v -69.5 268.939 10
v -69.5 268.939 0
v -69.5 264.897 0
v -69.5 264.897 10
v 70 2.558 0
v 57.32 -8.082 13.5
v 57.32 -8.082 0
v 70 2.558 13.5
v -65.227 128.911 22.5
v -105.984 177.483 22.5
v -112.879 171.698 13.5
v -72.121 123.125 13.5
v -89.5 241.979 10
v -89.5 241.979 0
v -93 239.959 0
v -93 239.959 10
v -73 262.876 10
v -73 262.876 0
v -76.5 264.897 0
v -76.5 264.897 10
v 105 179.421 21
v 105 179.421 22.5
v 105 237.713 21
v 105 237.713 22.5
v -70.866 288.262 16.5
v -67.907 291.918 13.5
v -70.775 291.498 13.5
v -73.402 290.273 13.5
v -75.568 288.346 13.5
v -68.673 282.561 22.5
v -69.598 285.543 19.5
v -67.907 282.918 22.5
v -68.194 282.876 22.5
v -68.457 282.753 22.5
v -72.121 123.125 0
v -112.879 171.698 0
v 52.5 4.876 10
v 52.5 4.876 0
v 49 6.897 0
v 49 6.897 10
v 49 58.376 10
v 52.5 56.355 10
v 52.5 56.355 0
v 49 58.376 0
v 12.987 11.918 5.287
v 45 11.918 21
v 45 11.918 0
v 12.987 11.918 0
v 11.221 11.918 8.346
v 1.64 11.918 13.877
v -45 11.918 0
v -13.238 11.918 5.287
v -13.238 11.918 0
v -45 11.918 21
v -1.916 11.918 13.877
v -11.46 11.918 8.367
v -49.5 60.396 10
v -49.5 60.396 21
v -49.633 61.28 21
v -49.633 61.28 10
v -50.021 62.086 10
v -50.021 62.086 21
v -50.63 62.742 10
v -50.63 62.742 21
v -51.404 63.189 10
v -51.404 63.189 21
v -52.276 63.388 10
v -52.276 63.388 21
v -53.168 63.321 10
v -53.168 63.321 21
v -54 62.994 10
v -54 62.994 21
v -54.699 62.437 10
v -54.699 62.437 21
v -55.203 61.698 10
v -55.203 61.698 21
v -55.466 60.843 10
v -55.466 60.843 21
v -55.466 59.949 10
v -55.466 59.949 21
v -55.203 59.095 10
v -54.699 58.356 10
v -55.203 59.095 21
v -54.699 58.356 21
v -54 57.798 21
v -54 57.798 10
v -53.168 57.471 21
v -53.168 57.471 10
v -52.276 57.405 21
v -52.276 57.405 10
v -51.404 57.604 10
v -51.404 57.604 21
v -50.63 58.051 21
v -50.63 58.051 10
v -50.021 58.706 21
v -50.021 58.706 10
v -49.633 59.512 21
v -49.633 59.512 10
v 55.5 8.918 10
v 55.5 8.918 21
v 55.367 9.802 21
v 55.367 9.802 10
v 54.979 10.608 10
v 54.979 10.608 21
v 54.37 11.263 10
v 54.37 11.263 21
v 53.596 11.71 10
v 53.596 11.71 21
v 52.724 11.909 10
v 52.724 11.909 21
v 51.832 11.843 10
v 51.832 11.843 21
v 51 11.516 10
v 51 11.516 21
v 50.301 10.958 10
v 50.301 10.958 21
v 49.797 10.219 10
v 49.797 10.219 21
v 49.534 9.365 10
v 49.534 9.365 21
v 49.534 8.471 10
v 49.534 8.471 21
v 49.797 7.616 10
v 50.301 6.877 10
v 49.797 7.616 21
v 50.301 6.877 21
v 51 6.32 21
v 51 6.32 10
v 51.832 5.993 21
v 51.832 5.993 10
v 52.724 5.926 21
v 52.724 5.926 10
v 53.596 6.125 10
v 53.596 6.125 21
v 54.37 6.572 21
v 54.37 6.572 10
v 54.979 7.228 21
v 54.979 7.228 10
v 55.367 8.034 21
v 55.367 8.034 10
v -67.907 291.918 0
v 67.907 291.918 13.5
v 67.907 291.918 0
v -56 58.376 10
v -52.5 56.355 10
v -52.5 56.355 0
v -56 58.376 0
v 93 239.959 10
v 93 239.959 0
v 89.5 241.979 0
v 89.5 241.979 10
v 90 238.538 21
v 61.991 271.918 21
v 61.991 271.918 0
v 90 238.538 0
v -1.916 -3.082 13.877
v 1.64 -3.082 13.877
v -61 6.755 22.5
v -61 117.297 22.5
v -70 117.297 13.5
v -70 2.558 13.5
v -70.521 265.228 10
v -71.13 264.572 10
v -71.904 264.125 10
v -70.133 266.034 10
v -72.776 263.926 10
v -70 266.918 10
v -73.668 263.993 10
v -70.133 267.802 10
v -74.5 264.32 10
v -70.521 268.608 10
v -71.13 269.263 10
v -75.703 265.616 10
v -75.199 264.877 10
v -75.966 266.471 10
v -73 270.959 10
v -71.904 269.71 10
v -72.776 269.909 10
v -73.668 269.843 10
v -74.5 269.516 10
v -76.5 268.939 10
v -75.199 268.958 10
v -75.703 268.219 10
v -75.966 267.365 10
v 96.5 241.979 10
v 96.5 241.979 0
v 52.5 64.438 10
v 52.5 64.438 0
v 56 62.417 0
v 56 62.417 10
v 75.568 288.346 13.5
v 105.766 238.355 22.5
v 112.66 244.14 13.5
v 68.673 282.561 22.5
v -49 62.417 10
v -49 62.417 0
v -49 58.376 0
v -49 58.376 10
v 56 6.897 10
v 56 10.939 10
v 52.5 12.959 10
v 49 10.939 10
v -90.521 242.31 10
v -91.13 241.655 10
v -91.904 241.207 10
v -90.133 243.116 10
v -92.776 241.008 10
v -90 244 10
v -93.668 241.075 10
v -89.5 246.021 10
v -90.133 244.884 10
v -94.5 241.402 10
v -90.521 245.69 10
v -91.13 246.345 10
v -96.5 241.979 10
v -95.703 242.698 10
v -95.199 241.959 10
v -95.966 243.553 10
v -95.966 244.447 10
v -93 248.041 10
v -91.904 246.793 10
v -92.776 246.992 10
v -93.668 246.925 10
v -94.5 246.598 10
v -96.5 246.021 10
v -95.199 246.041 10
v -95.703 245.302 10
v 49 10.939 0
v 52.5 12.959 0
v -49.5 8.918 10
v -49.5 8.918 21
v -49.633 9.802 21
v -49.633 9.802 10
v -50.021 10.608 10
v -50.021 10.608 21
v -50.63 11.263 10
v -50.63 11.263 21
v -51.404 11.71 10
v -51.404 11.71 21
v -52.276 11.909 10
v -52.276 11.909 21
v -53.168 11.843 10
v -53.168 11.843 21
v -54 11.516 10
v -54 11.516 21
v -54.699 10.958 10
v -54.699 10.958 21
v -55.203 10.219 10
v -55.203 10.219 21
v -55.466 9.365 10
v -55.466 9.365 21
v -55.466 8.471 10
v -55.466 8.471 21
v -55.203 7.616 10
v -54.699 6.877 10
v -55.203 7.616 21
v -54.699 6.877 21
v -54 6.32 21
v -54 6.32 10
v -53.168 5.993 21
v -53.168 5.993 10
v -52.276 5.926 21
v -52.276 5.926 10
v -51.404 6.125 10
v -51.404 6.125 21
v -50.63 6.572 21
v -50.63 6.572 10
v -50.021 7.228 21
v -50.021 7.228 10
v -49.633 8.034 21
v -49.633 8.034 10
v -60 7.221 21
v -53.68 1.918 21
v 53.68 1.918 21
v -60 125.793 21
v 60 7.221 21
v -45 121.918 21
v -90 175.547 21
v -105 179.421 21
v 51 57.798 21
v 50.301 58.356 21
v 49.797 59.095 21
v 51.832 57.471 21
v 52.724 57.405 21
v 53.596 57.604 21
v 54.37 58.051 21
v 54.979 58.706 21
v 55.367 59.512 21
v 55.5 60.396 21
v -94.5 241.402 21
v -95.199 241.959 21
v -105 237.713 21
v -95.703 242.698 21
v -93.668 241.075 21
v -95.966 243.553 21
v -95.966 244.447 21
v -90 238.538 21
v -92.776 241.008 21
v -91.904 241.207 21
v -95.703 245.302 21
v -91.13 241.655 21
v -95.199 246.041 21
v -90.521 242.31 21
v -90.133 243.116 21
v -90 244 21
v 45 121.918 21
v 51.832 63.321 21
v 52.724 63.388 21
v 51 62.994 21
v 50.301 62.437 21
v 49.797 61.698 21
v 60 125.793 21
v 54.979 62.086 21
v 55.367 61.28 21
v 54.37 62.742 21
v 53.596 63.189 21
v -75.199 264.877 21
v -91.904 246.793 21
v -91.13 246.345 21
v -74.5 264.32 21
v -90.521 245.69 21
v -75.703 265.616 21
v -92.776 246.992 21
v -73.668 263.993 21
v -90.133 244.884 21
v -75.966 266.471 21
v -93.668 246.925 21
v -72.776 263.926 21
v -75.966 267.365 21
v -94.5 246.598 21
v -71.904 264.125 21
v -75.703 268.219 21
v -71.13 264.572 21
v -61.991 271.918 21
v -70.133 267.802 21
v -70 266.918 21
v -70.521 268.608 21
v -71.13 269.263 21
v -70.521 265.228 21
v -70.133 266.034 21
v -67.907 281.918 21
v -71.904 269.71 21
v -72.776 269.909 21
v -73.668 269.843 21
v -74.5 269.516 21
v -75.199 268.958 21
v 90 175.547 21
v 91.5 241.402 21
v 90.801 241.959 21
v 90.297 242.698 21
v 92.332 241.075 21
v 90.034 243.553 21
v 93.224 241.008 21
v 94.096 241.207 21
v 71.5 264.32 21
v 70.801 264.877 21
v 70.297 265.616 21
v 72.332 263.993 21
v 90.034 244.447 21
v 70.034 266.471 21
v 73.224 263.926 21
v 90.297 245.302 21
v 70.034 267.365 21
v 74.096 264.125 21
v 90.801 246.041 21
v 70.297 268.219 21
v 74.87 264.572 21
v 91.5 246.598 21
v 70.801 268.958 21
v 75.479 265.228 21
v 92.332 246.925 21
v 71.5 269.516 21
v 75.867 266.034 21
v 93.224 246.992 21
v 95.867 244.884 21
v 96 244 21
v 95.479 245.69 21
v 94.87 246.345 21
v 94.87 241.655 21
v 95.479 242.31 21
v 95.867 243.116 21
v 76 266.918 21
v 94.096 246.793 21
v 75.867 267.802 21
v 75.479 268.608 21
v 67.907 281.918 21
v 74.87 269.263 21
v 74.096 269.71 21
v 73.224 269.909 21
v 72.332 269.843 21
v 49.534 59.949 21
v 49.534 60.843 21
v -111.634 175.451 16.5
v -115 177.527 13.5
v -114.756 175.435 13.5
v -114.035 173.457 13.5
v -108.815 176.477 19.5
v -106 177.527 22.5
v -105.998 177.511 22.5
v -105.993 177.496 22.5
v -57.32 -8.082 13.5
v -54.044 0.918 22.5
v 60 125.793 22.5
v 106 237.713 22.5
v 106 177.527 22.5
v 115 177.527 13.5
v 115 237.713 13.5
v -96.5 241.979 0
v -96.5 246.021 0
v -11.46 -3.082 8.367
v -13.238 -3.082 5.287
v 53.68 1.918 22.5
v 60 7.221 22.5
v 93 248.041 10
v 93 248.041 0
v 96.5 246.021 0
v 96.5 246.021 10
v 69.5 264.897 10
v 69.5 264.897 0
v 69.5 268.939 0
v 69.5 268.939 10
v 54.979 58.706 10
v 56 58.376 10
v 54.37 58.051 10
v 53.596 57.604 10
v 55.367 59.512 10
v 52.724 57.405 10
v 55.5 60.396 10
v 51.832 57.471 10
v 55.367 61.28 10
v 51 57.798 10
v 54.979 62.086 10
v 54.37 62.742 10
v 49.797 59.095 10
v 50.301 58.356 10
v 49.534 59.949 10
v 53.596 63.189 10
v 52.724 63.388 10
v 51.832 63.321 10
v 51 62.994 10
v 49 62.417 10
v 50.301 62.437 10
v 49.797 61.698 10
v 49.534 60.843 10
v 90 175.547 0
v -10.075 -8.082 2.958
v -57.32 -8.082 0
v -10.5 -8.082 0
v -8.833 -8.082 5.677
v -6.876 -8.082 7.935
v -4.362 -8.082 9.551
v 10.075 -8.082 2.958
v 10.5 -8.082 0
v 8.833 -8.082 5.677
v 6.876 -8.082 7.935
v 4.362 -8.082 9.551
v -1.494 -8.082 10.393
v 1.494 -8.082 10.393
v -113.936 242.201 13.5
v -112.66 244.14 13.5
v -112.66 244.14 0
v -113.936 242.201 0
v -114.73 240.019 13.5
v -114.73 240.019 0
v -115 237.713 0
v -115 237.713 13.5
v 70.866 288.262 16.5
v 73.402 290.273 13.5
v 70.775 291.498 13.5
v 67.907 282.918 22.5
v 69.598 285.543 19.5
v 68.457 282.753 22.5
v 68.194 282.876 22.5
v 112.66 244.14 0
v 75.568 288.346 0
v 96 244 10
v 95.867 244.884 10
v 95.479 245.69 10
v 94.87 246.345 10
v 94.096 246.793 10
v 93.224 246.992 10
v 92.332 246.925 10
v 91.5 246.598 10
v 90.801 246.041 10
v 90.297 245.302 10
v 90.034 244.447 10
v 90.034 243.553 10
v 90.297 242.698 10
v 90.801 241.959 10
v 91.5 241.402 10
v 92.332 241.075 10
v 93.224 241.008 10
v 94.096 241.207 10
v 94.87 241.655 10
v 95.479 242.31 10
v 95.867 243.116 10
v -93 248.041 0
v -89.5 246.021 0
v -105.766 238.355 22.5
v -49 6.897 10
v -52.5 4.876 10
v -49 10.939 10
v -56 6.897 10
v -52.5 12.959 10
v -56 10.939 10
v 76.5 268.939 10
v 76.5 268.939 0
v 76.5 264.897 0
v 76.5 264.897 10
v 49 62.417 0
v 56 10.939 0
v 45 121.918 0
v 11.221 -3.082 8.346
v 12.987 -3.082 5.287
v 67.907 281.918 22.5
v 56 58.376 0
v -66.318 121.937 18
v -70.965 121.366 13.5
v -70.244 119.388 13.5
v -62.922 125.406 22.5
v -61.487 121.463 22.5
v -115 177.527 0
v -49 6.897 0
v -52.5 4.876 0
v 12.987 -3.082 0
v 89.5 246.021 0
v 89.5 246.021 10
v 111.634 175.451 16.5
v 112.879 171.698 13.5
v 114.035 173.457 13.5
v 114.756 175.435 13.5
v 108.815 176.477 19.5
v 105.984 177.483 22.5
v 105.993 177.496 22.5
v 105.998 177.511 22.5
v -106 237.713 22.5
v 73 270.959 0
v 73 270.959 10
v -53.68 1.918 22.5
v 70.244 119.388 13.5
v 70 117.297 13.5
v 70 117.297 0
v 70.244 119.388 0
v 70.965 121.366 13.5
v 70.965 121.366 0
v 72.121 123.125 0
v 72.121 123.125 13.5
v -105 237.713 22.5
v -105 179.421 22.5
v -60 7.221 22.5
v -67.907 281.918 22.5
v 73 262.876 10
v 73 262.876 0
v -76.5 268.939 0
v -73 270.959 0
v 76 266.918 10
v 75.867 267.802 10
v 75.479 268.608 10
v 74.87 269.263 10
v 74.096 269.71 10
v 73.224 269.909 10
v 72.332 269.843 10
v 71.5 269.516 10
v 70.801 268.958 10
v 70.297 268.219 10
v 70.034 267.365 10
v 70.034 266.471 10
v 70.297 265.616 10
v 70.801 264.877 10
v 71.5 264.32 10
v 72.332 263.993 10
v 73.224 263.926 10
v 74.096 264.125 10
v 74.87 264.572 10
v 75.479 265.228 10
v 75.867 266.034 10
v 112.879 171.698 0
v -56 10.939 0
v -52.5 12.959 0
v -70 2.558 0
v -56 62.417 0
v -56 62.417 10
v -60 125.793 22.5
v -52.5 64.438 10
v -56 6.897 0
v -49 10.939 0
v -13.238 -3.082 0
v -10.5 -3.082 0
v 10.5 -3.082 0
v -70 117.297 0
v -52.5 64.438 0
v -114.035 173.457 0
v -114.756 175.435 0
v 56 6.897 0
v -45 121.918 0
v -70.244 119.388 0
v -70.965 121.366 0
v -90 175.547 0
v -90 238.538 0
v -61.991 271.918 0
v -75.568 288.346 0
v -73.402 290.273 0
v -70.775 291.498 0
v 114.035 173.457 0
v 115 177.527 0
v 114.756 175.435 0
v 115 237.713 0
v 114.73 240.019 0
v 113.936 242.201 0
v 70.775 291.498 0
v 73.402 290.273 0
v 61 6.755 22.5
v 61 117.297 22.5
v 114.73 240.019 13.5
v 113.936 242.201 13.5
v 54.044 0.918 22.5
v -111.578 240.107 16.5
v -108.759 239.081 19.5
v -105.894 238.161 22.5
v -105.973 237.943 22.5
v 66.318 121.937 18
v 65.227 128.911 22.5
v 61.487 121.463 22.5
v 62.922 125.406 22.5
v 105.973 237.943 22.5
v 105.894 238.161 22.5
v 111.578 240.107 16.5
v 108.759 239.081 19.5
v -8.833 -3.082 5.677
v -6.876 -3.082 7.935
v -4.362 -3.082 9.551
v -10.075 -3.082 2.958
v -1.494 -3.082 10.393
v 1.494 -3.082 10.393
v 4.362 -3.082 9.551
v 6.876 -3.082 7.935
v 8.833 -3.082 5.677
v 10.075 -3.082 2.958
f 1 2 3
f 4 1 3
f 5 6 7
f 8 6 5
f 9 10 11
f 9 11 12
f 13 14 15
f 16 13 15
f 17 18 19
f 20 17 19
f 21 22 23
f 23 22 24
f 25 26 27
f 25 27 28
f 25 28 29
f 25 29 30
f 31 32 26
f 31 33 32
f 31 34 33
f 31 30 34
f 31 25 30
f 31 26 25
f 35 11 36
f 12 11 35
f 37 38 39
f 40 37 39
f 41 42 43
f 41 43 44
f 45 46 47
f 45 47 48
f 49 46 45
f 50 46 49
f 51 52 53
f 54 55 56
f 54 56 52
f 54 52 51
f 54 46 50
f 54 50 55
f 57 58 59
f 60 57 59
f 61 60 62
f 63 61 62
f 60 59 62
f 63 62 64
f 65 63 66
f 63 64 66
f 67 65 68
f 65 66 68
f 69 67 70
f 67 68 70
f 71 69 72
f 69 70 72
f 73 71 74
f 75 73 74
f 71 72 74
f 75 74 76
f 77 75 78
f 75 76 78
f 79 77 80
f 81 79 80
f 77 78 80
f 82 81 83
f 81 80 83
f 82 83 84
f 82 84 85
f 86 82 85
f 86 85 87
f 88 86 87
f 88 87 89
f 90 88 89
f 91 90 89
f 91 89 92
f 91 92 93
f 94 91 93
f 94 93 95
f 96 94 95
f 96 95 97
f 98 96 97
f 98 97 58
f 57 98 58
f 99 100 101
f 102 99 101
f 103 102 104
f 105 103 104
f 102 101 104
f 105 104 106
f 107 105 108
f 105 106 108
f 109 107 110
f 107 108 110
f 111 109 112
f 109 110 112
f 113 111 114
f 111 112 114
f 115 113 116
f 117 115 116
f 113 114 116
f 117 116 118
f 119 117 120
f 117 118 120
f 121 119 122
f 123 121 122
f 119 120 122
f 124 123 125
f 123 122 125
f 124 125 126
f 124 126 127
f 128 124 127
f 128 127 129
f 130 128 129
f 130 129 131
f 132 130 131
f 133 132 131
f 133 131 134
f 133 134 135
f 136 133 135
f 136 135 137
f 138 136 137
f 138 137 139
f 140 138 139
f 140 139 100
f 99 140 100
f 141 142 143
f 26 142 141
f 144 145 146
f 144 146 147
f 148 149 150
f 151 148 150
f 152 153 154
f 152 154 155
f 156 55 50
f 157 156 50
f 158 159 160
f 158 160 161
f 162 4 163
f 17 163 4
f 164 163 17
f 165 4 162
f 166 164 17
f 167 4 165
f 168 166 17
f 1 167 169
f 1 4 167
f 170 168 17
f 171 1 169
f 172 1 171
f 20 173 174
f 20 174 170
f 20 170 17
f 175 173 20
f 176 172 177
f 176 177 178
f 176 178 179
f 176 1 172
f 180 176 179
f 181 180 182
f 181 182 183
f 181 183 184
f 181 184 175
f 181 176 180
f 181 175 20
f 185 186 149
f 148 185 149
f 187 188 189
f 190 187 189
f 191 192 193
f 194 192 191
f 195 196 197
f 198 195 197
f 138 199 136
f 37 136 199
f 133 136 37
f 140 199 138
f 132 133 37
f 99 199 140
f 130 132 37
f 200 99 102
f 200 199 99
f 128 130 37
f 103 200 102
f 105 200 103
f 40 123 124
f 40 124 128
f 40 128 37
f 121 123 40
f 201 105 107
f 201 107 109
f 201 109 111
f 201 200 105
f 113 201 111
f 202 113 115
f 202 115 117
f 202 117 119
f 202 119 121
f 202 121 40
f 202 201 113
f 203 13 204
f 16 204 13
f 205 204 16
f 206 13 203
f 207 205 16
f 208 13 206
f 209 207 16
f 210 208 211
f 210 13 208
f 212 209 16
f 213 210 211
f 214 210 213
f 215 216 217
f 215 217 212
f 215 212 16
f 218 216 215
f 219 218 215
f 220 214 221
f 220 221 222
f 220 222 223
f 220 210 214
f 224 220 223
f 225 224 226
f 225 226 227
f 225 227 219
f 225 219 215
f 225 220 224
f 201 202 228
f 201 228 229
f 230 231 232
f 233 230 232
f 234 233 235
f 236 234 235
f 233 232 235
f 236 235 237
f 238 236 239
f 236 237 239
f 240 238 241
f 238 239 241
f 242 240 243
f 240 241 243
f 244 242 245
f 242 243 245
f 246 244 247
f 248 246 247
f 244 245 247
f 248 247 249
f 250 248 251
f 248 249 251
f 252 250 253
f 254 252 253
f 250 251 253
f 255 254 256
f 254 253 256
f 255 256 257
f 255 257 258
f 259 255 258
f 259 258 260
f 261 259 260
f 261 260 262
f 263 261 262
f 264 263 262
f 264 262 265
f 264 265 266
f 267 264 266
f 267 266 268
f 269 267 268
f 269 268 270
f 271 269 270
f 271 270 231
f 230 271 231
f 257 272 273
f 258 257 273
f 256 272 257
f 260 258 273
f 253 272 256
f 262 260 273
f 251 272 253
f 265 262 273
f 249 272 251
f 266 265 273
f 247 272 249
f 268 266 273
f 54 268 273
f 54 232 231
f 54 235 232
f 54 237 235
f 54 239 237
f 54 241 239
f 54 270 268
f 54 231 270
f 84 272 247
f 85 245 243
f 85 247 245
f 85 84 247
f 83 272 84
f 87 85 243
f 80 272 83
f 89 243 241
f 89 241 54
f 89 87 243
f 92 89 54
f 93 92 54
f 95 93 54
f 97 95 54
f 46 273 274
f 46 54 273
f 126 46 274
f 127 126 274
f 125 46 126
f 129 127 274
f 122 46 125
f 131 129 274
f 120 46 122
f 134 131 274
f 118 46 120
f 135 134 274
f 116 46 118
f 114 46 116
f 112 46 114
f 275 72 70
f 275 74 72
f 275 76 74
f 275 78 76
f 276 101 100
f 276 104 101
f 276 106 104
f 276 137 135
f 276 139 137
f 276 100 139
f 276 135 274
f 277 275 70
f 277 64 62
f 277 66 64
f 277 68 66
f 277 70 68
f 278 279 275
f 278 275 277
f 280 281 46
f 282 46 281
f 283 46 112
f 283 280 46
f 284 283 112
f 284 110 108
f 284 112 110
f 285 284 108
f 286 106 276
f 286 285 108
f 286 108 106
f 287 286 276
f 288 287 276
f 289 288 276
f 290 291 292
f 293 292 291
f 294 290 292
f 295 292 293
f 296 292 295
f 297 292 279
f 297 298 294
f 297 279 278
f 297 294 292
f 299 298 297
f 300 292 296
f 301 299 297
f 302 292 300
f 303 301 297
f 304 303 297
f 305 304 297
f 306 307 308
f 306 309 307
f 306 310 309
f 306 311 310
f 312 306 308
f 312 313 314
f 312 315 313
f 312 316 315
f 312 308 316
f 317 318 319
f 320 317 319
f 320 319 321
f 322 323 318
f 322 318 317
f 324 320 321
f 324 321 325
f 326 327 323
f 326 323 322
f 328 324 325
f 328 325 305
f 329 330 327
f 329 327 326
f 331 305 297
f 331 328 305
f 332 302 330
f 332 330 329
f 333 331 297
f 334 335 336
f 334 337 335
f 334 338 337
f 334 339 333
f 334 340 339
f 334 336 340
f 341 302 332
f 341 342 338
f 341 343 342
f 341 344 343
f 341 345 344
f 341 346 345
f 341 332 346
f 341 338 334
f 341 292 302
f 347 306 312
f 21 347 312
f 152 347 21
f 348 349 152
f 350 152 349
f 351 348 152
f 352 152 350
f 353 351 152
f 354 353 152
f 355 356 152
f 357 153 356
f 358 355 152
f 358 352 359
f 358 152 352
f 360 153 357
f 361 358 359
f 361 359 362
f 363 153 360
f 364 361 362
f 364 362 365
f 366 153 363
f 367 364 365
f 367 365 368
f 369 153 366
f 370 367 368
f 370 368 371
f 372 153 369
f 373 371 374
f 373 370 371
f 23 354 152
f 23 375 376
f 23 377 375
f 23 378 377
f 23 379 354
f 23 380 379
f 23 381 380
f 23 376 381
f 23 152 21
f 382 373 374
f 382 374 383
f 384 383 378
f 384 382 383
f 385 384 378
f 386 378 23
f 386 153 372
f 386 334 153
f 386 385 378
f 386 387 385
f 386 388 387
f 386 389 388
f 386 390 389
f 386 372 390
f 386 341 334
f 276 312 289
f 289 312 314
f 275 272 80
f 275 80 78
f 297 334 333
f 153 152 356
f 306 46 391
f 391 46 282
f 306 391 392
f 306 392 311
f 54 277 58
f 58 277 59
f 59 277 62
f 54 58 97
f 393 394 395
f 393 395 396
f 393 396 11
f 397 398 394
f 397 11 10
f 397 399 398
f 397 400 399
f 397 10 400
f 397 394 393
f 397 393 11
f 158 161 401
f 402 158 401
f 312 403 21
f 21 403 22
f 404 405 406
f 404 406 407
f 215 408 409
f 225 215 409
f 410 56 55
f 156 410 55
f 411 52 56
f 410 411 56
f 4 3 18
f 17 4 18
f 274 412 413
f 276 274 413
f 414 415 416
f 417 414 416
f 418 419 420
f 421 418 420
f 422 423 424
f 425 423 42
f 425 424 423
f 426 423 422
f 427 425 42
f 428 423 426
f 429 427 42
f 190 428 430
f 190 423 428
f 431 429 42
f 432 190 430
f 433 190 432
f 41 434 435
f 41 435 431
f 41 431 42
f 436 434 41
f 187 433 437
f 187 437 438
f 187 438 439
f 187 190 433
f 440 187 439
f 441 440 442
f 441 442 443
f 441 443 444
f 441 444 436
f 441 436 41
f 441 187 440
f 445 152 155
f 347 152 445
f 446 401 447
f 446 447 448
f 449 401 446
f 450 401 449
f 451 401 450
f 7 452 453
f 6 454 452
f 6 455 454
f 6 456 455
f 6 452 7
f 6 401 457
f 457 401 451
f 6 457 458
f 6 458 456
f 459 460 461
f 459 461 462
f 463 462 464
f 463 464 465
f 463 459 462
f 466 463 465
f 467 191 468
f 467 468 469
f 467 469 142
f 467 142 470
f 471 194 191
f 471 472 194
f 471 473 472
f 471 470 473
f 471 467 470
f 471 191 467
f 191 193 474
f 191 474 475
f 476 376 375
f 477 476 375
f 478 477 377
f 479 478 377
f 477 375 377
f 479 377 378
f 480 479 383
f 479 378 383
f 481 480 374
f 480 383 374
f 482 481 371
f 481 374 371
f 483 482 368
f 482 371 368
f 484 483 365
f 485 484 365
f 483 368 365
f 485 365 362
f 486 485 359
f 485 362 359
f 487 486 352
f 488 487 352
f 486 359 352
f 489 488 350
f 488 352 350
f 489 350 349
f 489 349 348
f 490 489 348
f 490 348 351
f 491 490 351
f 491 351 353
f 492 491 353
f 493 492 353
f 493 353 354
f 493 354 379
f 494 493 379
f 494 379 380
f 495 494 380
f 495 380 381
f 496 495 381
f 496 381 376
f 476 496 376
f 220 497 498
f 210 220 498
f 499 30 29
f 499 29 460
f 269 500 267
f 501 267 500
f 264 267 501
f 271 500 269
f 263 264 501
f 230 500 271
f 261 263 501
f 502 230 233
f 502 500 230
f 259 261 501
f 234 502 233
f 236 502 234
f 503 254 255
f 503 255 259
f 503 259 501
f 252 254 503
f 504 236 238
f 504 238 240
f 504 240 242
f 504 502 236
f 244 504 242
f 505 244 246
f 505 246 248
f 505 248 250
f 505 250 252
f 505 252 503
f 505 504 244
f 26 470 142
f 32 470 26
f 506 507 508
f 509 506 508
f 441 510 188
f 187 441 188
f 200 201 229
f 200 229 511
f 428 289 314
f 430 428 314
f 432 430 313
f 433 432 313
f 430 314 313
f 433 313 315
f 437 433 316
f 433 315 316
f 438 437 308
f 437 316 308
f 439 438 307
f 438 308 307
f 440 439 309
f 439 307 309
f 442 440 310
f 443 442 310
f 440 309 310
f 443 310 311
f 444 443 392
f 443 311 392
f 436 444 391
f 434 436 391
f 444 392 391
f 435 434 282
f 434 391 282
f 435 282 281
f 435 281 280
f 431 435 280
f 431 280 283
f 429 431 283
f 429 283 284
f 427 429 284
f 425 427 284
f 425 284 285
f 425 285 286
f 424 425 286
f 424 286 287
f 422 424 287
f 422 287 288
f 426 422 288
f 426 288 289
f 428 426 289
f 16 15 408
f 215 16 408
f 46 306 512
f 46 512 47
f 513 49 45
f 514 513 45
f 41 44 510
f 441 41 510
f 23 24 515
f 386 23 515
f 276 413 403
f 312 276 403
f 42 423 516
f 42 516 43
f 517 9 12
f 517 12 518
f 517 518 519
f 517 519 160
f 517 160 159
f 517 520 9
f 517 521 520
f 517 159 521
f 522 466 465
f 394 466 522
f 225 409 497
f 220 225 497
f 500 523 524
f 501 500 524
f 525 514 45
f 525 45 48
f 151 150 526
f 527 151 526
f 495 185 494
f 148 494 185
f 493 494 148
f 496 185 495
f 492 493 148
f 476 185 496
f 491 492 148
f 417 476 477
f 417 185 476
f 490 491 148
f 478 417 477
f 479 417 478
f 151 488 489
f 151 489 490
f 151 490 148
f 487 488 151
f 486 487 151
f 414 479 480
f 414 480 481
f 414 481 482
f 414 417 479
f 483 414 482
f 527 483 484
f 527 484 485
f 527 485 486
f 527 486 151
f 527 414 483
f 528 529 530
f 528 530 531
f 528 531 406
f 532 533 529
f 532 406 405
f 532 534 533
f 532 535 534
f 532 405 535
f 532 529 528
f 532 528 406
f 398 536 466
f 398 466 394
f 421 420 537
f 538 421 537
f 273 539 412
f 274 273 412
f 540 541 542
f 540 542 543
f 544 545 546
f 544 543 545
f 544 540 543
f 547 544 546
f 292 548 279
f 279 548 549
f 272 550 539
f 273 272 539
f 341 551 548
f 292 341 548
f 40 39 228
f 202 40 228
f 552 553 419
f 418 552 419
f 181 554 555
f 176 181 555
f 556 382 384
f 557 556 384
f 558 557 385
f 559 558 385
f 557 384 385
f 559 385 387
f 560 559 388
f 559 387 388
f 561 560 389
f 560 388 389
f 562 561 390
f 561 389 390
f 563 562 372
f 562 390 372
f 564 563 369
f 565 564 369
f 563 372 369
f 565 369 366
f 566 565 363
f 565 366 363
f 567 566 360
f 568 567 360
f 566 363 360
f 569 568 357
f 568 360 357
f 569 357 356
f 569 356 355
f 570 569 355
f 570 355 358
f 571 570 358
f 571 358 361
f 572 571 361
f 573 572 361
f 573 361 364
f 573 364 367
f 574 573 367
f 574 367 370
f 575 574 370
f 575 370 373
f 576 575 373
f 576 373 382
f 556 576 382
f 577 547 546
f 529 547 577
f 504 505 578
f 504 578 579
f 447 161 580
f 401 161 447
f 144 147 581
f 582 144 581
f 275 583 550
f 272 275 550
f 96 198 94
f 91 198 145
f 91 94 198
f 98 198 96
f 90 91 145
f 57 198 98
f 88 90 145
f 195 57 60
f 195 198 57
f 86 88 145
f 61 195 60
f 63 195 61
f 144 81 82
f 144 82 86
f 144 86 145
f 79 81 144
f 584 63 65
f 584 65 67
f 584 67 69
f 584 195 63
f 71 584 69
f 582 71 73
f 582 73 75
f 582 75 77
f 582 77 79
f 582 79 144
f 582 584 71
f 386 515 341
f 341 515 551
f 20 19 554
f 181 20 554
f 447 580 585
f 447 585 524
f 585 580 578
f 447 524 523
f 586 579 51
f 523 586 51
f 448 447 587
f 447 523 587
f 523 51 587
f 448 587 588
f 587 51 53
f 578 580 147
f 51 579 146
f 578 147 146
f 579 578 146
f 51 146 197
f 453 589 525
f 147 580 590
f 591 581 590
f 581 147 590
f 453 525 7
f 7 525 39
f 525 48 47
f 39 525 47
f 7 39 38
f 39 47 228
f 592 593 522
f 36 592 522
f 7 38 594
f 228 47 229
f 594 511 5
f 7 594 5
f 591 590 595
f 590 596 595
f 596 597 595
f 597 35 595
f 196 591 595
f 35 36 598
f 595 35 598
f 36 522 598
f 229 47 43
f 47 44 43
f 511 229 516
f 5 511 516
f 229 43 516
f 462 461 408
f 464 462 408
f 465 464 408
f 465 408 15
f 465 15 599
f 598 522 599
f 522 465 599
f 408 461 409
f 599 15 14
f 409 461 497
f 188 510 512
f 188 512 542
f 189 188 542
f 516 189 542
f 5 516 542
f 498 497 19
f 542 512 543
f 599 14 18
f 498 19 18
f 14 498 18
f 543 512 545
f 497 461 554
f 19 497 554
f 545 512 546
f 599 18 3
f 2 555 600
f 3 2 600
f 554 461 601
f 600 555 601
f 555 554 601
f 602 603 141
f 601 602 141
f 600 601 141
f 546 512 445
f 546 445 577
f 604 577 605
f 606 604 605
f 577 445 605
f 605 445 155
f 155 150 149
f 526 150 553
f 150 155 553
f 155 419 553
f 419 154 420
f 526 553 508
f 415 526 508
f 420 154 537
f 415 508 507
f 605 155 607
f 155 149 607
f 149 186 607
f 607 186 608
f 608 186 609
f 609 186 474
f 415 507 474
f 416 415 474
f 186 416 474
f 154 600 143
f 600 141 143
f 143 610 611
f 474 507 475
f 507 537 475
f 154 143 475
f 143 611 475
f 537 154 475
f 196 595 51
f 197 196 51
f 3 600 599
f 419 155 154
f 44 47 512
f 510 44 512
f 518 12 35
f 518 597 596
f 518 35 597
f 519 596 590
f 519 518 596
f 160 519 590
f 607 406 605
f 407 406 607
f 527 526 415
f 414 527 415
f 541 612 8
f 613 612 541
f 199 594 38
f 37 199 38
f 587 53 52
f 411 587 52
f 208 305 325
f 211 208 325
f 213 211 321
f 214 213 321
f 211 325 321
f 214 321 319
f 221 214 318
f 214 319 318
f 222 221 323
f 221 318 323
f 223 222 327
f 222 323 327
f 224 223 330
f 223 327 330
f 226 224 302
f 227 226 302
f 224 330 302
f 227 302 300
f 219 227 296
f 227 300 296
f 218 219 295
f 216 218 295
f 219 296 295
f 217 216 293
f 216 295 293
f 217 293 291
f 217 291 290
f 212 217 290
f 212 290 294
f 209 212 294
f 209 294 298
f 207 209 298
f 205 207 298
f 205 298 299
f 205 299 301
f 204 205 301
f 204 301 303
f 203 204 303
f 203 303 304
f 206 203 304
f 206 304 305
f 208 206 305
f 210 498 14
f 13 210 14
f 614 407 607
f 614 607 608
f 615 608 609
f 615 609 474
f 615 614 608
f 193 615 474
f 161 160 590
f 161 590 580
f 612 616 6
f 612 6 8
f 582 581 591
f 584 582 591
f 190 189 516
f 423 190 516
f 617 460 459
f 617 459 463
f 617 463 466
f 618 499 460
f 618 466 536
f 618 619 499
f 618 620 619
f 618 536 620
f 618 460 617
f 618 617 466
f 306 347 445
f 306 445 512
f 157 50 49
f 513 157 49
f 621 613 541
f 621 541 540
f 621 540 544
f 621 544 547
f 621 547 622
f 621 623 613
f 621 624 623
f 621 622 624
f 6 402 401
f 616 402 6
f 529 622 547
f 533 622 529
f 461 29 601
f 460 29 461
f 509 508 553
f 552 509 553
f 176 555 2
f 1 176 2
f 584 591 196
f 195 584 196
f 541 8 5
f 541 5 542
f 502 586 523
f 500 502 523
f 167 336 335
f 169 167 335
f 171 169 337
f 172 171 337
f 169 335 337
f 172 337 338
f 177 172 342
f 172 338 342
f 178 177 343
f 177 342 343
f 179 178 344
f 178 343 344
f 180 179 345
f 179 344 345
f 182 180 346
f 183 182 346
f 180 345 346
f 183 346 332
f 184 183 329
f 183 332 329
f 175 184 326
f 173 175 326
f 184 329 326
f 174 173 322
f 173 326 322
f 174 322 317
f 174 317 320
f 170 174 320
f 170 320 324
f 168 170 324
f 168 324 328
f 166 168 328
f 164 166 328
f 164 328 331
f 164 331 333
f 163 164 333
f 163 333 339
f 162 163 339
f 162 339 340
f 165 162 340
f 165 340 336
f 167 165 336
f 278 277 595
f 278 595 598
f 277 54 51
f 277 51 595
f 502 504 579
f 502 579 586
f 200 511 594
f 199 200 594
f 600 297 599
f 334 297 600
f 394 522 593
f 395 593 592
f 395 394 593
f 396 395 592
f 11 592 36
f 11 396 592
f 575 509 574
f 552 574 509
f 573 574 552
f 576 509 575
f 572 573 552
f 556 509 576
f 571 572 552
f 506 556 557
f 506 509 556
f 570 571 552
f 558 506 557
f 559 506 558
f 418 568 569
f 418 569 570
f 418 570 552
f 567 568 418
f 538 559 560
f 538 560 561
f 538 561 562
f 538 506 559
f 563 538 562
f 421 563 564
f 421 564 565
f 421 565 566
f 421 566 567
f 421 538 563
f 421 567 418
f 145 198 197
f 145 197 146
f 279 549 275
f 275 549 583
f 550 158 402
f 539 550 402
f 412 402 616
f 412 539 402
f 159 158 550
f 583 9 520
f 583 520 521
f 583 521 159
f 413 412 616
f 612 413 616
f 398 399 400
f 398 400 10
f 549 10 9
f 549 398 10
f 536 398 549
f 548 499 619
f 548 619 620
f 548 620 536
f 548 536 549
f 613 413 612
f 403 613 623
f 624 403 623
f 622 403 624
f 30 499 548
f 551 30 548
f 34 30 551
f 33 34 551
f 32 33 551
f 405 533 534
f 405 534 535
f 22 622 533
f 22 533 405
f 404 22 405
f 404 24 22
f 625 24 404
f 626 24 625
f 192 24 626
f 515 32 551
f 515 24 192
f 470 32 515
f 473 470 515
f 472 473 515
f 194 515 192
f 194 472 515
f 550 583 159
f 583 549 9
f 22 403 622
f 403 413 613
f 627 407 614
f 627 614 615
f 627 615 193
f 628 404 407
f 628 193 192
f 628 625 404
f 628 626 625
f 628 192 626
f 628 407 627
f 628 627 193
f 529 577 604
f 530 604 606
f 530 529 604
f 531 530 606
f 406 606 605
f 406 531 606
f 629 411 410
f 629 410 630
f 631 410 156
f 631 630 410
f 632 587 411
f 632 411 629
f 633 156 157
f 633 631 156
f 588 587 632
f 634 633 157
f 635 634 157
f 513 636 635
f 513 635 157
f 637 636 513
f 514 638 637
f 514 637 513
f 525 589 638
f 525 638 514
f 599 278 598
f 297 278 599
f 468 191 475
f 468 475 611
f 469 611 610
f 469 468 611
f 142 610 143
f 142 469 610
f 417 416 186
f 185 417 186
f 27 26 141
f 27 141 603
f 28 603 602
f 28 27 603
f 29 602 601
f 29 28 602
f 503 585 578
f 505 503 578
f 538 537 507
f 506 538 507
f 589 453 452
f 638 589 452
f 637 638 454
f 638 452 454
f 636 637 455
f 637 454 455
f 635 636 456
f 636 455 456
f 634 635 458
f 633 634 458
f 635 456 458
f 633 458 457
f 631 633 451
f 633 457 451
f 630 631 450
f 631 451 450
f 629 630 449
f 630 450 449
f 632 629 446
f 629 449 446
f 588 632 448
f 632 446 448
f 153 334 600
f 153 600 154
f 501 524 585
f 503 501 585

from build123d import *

# Parameters (mm, degrees)
RESSALTO_EXTRUS_O1_DEPTH = 22.5
CHANFRO1_SIZE            = 9
CORTE_EXTRUS_O1_REACH    = 24.5
ESBO_O3_W                = 1139.230904301
ESBO_O3_H                = 709.798033895
CORTE_EXTRUS_O5_DEPTH    = 1.5
ESBO_O5_R                = 3
CORTE_EXTRUS_O6_DEPTH    = 22
CORTE_EXTRUS_O8_DEPTH    = 10
CORTE_EXTRUS_O12_DEPTH   = 15
ESBO_O13_R               = 10.5
CORTE_EXTRUS_O13_DEPTH   = 5


with BuildPart() as part:
    # Esboço1 → Ressalto-extrusão1 (new body, symmetric)
    with BuildSketch(Plane.XY):
        with BuildLine():
            Line((-57.319579452, -8.082215343), (57.319579452, -8.082215343))
            Line((57.319579452, -8.082215343), (70, 2.557920862))
            Line((70, 2.557920862), (70, 117.296691049))
            ThreePointArc((70, 117.296691049), (70.546863139, 120.39810603), (72.121492792, 123.125444592))
            Line((72.121492792, 123.125444592), (112.878507208, 171.697762944))
            ThreePointArc((112.878507208, 171.697762944), (114.453136861, 174.425101506), (115, 177.526516487))
            Line((115, 177.526516487), (115, 237.712528581))
            ThreePointArc((115, 237.712528581), (114.396926208, 241.132730014), (112.660444431, 244.140404678))
            Line((112.660444431, 244.140404678), (75.567830361, 288.345660754))
            ThreePointArc((75.567830361, 288.345660754), (72.133568548, 290.980862527), (67.90738593, 291.917784657))
            Line((67.90738593, 291.917784657), (-67.90738593, 291.917784657))
            ThreePointArc((-67.90738593, 291.917784657), (-72.133568548, 290.980862527), (-75.567830361, 288.345660754))
            Line((-75.567830361, 288.345660754), (-112.660444431, 244.140404678))
            ThreePointArc((-112.660444431, 244.140404678), (-114.396926208, 241.132730014), (-115, 237.712528581))
            Line((-115, 237.712528581), (-115, 177.526516487))
            ThreePointArc((-115, 177.526516487), (-114.453136861, 174.425101506), (-112.878507208, 171.697762944))
            Line((-112.878507208, 171.697762944), (-72.121492792, 123.125444592))
            ThreePointArc((-72.121492792, 123.125444592), (-70.546863139, 120.39810603), (-70, 117.296691049))
            Line((-70, 117.296691049), (-70, 2.557920862))
            Line((-70, 2.557920862), (-57.319579452, -8.082215343))
        make_face()
        Polygon((-90, 175.546696324), (-90, 238.538123078), (-61.99113828, 271.917784657), (61.99113828, 271.917784657), (90, 238.538123078), (90, 175.546696324), (45, 121.917784657), (45, 11.917784657), (-45, 11.917784657), (-45, 121.917784657), align=None, mode=Mode.SUBTRACT)
    extrude(amount=RESSALTO_EXTRUS_O1_DEPTH, both=True)

    # Chanfro1
    chanfro1_edges = [part.edges().sort_by_distance(p)[0] for p in [
        (0, -8.082215343, 22.5),
        (63.659789726, -2.76214724, 22.5),
        (70, 59.927305955, 22.5),
        (70.546863139, 120.39810603, 22.5),
        (92.5, 147.411603768, 22.5),
        (114.453136861, 174.425101506, 22.5),
        (115, 207.619522534, 22.5),
        (114.396926208, 241.132730014, 22.5),
        (94.114137396, 266.243032716, 22.5),
        (72.133568548, 290.980862527, 22.5),
        (0, 291.917784657, 22.5),
        (-72.133568548, 290.980862527, 22.5),
        (-94.114137396, 266.243032716, 22.5),
        (-114.396926208, 241.132730014, 22.5),
        (-115, 207.619522534, 22.5),
        (-114.453136861, 174.425101506, 22.5),
        (-92.5, 147.411603768, 22.5),
        (-70.546863139, 120.39810603, 22.5),
        (-70, 59.927305955, 22.5),
        (-63.659789726, -2.76214724, 22.5),
    ]]
    chamfer(chanfro1_edges, length=CHANFRO1_SIZE)

    # Esboço3 → Corte-extrusão1 (cut, up to next)
    with BuildSketch(Plane.XY, mode=Mode.PRIVATE) as corte_extrus_o1_sk1:
        with Locations((-153.157436203, 152.53565808)):
            Rectangle(ESBO_O3_W, ESBO_O3_H)
    corte_extrus_o1_tool1 = extrude(corte_extrus_o1_sk1.sketch, amount=-CORTE_EXTRUS_O1_REACH, mode=Mode.PRIVATE) & part.part
    add(corte_extrus_o1_tool1.solids().sort_by_distance((-153.157436, 152.535658, 0))[0], mode=Mode.SUBTRACT)

    # Esboço4 → Corte-extrusão5 (cut)
    with BuildSketch(Plane.XY.offset(22.5)):
        Polygon((-60, 7.220997444), (-53.679877109, 1.917784657), (53.679877109, 1.917784657), (60, 7.220997444), (60, 125.792574104), (105, 179.421485771), (105, 237.712528581), (67.90738593, 281.917784657), (-67.90738593, 281.917784657), (-105, 237.712528581), (-105, 179.421485771), (-60, 125.792574104), align=None)
        Polygon((-90, 175.546696324), (-90, 238.538123078), (-61.99113828, 271.917784657), (61.99113828, 271.917784657), (90, 238.538123078), (90, 175.546696324), (45, 121.917784657), (45, 11.917784657), (-45, 11.917784657), (-45, 121.917784657), align=None, mode=Mode.SUBTRACT)
    extrude(amount=-CORTE_EXTRUS_O5_DEPTH, mode=Mode.SUBTRACT)

    # Esboço5 → Corte-extrusão6 (cut, through all)
    with BuildSketch(Plane.XY.offset(21)):
        with Locations((-93, 244)):
            Circle(ESBO_O5_R)
        with Locations((-52.5, 60.396230411)):
            Circle(ESBO_O5_R)
        with Locations((-73, 266.917784657)):
            Circle(ESBO_O5_R)
        with Locations((-52.5, 8.917784657)):
            Circle(ESBO_O5_R)
        with Locations((52.5, 8.917784657)):
            Circle(ESBO_O5_R)
        with Locations((73, 266.917784657)):
            Circle(ESBO_O5_R)
        with Locations((52.5, 60.396230411)):
            Circle(ESBO_O5_R)
        with Locations((93, 244)):
            Circle(ESBO_O5_R)
    extrude(amount=-CORTE_EXTRUS_O6_DEPTH, mode=Mode.SUBTRACT)

    # Esboço7 → Corte-extrusão8 (cut)
    with BuildSketch(Plane(origin=(0, 0, 0), x_dir=(-1, 0, 0), z_dir=(0, 0, -1))):
        Polygon((-73, 270.959236541), (-76.5, 268.938510599), (-76.5, 264.897058715), (-73, 262.876332773), (-69.5, 264.897058715), (-69.5, 268.938510599), align=None)
        Polygon((73, 270.959236541), (69.5, 268.938510599), (69.5, 264.897058715), (73, 262.876332773), (76.5, 264.897058715), (76.5, 268.938510599), align=None)
        Polygon((-93, 248.041451884), (-96.5, 246.020725942), (-96.5, 241.979274058), (-93, 239.958548116), (-89.5, 241.979274058), (-89.5, 246.020725942), align=None)
        Polygon((-52.5, 64.437682295), (-56, 62.416956353), (-56, 58.375504468), (-52.5, 56.354778526), (-49, 58.375504468), (-49, 62.416956353), align=None)
        Polygon((-52.5, 12.959236541), (-56, 10.938510599), (-56, 6.897058715), (-52.5, 4.876332773), (-49, 6.897058715), (-49, 10.938510599), align=None)
        Polygon((52.5, 12.959236541), (49, 10.938510599), (49, 6.897058715), (52.5, 4.876332773), (56, 6.897058715), (56, 10.938510599), align=None)
        Polygon((52.5, 64.437682295), (49, 62.416956353), (49, 58.375504468), (52.5, 56.354778526), (56, 58.375504468), (56, 62.416956353), align=None)
        Polygon((93, 248.041451884), (89.5, 246.020725942), (89.5, 241.979274058), (93, 239.958548116), (96.5, 241.979274058), (96.5, 246.020725942), align=None)
    extrude(amount=-CORTE_EXTRUS_O8_DEPTH, mode=Mode.SUBTRACT)

    # Esboço12 → Corte-extrusão12 (cut)
    with BuildSketch(Plane(origin=(0, 11.917784657, 0), x_dir=(1, 0, 0), z_dir=(0, 1, 0))):
        Polygon((-1.905573841, 14.34102327), (-11.457834044, 8.82602327), (-13.237834044, 5.742972833), (-13.237834044, -5.287027167), (-11.459750431, -8.366758325), (-1.915917658, -13.876892746), (1.640249569, -13.876892746), (11.220862954, -8.34552303), (12.986686363, -5.287027167), (12.986686363, 5.742972833), (11.206686363, 8.82602327), (1.654426159, 14.34102327), align=None)
    extrude(amount=-CORTE_EXTRUS_O12_DEPTH, mode=Mode.SUBTRACT)

    # Esboço13 → Corte-extrusão13 (cut)
    with BuildSketch(Plane.XZ.offset(8.082215343)):
        Circle(ESBO_O13_R)
    extrude(amount=-CORTE_EXTRUS_O13_DEPTH, mode=Mode.SUBTRACT)


solid = part.part
